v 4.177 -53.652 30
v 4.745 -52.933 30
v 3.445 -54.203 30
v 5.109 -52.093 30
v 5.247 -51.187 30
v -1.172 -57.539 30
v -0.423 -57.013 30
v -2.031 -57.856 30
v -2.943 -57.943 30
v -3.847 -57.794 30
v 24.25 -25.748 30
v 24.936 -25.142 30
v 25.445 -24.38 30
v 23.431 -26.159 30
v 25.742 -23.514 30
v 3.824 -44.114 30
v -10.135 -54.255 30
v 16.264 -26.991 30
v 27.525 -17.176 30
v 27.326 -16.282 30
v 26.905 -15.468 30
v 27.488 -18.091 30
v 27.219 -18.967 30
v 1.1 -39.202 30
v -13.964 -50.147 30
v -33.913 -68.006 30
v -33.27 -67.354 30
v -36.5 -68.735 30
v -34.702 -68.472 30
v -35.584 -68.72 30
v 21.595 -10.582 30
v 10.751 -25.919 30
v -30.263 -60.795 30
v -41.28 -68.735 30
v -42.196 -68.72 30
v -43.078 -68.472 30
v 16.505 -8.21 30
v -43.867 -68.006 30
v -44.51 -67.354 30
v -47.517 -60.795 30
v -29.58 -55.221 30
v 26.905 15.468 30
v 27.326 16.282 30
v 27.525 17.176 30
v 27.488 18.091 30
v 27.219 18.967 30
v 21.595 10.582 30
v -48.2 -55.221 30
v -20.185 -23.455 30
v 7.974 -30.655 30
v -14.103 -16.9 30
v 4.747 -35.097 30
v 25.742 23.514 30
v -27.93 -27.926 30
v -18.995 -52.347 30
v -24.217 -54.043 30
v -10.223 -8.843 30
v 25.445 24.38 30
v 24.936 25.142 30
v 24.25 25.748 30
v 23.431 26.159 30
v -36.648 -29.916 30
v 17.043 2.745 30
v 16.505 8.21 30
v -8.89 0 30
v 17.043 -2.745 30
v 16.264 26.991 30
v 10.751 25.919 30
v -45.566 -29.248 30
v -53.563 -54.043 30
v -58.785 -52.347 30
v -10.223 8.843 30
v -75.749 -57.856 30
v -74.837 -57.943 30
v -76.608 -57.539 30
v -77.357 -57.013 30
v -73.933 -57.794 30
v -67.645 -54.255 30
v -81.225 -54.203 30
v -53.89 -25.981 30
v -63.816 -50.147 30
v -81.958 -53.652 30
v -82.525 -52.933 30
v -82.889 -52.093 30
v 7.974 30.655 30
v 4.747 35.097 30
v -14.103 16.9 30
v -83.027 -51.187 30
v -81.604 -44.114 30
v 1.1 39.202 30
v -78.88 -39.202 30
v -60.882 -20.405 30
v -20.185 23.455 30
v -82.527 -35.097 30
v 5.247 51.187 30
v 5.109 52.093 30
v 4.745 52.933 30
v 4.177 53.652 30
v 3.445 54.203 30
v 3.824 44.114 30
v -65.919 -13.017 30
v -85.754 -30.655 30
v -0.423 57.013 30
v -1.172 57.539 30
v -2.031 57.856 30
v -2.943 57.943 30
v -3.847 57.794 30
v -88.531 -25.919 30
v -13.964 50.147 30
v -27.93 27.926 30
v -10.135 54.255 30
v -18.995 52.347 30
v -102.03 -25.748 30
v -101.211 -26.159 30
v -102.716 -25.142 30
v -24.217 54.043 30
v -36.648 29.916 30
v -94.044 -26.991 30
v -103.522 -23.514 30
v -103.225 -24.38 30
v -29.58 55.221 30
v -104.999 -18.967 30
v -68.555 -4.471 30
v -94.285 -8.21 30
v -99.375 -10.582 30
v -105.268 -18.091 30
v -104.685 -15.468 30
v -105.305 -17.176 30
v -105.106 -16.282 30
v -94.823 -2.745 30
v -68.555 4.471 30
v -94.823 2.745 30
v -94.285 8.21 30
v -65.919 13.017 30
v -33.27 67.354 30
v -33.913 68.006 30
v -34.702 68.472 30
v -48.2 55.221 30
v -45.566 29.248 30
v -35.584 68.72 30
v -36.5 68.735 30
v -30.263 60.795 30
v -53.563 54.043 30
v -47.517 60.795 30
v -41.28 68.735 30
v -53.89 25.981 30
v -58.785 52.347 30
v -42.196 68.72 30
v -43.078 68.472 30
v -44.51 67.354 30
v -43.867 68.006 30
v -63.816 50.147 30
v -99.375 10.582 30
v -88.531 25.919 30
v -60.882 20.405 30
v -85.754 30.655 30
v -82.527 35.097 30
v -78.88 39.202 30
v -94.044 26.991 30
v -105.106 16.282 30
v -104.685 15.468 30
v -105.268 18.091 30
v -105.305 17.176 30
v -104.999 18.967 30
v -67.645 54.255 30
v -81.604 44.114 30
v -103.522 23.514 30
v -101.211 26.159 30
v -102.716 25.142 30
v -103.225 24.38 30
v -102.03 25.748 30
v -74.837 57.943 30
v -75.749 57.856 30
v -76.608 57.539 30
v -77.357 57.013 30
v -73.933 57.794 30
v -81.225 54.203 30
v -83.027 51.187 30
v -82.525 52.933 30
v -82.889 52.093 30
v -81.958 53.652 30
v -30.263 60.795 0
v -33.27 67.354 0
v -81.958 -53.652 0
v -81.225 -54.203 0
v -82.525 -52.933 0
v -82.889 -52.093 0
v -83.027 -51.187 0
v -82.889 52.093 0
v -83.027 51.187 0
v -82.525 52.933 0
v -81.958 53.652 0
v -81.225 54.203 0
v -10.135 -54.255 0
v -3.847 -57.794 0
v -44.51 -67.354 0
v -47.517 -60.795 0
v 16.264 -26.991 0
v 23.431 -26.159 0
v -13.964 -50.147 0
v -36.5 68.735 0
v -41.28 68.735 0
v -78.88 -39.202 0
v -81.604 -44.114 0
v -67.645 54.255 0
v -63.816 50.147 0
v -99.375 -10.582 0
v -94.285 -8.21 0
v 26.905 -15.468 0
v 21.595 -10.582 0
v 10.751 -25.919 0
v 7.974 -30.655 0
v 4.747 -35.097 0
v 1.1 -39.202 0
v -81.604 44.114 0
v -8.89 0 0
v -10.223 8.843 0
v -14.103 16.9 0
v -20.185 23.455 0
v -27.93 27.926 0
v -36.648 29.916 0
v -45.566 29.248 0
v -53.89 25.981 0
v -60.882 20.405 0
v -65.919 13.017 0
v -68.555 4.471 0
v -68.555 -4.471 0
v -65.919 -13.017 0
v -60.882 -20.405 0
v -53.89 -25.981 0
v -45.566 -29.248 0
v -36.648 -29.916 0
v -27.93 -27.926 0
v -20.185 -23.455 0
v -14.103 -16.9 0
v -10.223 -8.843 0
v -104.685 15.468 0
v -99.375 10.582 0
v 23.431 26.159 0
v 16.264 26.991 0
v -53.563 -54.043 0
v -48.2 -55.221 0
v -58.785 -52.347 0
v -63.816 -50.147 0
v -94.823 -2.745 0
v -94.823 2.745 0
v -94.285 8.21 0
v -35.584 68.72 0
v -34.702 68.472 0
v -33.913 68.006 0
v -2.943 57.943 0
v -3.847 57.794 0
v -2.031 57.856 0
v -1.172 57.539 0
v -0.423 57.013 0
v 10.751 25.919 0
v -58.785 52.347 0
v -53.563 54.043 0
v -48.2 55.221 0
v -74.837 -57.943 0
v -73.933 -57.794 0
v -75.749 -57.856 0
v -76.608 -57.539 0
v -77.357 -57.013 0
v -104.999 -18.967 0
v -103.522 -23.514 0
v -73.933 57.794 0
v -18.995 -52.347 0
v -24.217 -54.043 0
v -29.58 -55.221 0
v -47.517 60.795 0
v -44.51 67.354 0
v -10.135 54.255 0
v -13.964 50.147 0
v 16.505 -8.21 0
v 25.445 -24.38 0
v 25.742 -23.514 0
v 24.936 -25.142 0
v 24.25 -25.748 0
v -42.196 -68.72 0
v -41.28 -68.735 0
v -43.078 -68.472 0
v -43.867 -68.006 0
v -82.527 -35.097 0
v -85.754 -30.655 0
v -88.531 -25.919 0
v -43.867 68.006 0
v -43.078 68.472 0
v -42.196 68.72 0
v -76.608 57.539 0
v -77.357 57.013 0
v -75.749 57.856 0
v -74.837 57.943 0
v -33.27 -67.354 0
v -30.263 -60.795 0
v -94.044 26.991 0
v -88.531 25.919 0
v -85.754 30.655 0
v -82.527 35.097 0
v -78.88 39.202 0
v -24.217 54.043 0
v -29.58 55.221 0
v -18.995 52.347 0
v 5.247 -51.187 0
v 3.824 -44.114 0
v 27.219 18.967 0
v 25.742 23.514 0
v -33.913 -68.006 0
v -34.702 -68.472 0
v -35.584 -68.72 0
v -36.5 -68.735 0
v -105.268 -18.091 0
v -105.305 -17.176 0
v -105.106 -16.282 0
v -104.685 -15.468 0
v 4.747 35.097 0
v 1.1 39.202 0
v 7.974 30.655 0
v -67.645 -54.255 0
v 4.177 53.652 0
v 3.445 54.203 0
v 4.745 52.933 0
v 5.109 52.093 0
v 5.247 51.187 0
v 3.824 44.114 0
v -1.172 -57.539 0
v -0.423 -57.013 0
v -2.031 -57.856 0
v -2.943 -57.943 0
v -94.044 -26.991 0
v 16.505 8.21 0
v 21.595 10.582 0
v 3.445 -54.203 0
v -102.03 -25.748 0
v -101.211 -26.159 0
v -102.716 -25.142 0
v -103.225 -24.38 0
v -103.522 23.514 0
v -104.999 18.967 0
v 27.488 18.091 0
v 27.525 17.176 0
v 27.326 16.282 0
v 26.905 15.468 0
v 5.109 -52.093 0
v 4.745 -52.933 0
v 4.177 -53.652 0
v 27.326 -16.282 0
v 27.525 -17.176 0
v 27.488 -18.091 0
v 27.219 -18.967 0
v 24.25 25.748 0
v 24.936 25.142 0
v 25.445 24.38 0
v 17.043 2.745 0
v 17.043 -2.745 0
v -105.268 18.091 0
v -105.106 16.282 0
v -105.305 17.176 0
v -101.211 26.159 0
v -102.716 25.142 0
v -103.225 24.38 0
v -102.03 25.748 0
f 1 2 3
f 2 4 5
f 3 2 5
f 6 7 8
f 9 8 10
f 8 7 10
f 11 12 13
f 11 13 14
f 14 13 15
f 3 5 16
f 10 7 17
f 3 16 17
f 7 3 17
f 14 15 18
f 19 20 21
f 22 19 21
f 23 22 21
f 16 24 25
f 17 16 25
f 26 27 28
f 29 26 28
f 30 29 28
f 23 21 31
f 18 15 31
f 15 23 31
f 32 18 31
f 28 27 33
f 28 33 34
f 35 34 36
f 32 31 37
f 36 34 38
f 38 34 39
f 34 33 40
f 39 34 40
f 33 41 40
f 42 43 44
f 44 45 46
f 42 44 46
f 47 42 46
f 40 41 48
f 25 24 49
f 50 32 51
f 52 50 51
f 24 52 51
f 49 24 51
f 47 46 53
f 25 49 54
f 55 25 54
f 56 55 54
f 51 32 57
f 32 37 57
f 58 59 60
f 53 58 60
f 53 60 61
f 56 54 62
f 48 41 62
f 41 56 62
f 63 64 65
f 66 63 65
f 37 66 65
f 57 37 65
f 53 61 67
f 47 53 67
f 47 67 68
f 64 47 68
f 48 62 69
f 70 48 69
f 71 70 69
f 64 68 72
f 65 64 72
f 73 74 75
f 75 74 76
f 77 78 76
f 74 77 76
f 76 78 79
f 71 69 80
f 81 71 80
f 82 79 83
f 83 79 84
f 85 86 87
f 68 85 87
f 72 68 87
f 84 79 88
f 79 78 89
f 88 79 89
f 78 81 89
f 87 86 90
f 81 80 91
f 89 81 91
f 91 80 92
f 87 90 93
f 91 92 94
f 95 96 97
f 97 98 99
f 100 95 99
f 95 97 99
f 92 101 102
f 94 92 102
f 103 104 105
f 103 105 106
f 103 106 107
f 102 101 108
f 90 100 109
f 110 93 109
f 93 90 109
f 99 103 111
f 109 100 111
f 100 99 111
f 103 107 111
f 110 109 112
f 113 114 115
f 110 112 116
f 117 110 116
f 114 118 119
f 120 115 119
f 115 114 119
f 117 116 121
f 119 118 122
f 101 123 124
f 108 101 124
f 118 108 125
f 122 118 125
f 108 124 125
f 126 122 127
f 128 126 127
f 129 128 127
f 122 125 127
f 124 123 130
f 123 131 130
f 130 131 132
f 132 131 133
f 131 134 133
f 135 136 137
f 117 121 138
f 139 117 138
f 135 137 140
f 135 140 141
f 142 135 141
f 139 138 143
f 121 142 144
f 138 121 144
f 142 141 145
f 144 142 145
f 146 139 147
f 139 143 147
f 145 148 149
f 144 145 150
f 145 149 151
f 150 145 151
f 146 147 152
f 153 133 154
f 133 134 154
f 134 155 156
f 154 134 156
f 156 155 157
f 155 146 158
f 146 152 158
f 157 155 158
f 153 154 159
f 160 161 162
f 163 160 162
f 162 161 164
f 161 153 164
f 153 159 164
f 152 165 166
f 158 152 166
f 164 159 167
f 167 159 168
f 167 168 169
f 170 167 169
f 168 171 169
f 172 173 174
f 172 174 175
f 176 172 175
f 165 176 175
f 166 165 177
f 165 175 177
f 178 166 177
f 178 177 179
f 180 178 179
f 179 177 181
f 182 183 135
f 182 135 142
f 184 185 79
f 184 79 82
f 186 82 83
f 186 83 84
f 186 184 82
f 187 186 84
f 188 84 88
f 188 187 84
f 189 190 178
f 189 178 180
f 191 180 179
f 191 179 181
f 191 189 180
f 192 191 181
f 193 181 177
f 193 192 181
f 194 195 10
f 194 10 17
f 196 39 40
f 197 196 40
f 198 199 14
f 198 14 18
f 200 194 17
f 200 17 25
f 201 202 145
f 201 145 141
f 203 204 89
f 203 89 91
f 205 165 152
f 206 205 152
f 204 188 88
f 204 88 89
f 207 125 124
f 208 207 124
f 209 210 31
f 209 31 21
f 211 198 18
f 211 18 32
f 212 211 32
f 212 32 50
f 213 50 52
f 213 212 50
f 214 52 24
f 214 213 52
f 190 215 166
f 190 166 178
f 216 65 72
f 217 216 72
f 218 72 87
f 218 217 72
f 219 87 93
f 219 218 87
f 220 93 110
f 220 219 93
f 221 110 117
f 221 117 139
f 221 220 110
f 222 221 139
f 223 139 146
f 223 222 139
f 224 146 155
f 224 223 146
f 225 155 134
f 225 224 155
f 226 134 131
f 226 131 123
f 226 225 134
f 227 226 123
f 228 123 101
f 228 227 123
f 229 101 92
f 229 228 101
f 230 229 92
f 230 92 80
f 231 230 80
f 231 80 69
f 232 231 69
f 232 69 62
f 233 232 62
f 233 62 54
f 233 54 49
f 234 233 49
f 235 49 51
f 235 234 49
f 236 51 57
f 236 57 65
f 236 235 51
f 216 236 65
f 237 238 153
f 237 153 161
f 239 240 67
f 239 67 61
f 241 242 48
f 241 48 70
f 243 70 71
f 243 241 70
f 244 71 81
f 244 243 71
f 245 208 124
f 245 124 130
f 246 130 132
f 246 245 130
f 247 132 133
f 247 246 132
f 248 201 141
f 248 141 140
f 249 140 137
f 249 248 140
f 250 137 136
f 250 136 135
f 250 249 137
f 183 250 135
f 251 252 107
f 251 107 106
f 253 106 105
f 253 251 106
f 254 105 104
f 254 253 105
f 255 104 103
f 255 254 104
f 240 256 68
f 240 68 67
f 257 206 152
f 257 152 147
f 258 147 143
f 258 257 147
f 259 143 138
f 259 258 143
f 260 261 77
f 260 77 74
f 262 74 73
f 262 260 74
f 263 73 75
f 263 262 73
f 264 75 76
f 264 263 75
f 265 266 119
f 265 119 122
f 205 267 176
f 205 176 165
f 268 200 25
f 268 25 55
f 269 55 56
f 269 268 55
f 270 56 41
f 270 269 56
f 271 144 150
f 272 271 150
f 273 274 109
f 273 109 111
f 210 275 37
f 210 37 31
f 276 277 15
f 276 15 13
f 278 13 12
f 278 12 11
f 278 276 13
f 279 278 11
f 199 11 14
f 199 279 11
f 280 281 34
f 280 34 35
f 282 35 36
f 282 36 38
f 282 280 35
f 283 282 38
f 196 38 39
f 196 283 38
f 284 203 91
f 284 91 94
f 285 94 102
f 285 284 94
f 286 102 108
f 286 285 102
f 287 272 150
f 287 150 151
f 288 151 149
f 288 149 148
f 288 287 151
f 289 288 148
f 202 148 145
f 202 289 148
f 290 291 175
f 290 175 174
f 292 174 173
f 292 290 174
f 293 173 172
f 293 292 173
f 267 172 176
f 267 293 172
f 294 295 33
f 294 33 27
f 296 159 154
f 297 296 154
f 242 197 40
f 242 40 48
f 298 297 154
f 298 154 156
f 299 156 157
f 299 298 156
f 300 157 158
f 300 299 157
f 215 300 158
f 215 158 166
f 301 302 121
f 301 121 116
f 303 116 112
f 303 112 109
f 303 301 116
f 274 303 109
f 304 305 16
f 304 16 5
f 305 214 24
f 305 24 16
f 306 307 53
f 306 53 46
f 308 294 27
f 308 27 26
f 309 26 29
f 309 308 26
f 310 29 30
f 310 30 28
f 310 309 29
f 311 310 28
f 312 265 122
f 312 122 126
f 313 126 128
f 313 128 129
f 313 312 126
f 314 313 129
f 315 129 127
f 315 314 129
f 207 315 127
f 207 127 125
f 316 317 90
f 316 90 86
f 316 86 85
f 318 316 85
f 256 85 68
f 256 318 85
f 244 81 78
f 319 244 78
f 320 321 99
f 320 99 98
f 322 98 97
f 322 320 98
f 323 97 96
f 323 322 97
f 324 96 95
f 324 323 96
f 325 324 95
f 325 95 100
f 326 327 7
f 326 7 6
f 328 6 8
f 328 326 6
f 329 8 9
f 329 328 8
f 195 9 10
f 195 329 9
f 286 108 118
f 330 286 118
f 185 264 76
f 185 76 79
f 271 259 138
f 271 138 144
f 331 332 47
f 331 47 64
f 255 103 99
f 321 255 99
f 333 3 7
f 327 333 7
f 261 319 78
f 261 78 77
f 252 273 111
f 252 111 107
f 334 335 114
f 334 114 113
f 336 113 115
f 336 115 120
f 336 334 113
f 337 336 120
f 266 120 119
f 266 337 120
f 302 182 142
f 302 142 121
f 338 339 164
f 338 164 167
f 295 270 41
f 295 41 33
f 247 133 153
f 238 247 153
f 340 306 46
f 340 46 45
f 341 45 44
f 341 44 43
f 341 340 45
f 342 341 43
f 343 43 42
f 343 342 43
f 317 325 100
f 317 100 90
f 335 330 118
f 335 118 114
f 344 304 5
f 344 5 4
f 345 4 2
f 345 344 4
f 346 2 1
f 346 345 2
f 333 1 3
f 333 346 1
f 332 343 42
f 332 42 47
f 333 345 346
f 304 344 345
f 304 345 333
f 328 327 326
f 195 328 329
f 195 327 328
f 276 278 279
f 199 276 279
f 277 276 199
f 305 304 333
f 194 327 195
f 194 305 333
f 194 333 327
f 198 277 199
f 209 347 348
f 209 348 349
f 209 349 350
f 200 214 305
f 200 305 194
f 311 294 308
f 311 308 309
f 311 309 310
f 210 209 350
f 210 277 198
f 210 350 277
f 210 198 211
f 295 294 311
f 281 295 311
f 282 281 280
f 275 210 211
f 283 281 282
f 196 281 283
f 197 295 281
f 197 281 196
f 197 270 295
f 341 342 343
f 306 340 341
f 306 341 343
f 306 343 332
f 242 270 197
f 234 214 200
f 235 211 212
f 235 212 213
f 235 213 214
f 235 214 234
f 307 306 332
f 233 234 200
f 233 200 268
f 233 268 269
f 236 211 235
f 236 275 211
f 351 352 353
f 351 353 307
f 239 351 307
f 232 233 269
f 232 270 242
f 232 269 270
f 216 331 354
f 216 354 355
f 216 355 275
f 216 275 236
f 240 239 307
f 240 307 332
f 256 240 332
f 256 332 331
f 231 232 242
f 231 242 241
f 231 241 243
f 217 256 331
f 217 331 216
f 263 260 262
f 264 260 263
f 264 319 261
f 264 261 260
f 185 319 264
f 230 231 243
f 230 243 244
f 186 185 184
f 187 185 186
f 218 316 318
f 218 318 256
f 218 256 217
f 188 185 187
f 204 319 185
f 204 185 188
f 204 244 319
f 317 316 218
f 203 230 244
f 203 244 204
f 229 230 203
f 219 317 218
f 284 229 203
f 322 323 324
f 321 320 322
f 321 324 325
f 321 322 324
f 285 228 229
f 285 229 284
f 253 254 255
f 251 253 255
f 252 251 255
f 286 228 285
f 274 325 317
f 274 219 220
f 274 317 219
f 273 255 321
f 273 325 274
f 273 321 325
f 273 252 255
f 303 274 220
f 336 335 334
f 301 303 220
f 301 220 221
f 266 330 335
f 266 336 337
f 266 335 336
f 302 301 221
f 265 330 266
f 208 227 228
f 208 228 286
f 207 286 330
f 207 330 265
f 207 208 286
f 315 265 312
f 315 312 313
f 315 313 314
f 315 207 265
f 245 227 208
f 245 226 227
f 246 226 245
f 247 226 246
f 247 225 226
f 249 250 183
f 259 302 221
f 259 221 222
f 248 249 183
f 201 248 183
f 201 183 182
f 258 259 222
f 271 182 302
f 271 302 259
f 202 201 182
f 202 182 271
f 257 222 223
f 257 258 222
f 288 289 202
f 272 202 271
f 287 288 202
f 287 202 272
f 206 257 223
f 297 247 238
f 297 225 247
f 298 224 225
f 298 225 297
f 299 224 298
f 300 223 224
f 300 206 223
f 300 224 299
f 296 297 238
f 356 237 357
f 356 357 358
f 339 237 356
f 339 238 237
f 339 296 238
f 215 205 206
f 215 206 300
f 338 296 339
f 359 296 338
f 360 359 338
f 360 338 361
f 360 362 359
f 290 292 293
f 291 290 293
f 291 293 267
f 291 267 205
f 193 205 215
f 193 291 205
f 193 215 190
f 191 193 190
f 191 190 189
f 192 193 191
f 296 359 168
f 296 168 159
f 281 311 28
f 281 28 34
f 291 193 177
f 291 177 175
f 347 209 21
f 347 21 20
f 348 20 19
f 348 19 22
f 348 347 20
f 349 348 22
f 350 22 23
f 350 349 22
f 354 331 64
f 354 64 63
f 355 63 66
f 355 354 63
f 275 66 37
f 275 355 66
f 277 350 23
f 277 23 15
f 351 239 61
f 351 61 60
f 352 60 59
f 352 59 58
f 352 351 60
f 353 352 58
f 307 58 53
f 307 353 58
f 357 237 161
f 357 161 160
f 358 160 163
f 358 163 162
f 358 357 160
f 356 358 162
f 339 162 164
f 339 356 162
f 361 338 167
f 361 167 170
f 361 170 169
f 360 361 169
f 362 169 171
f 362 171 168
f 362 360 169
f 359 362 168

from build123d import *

# Parameters (mm, degrees)
SZKIC1_R                    = 30
DODANIE_WYCI_GNI_CIE1_DEPTH = 30


with BuildPart() as part:
    # Szkic1 → Dodanie-wyciągnięcie1 (new body)
    with BuildSketch(Plane.XY):
        with BuildLine():
            Line((-48.200266446, 55.220649807), (-47.516798881, 60.795035566))
            Line((-47.516798881, 60.795035566), (-44.510409747, 67.354430039))
            ThreePointArc((-44.510409747, 67.354430039), (-43.078000693, 68.471781184), (-41.280473034, 68.734770905))
            Line((-41.280473034, 68.734770905), (-36.499658689, 68.734770905))
            ThreePointArc((-36.499658689, 68.734770905), (-34.70213103, 68.471781184), (-33.269721976, 67.354430039))
            Line((-33.269721976, 67.354430039), (-30.263332842, 60.795035566))
            Line((-30.263332842, 60.795035566), (-29.579865278, 55.220649807))
            ThreePointArc((-29.579865278, 55.220649807), (-21.585114177, 53.259164913), (-13.964292777, 50.146842733))
            Line((-13.964292777, 50.146842733), (-10.134814162, 54.254883391))
            Line((-10.134814162, 54.254883391), (-3.847078926, 57.794433797))
            ThreePointArc((-3.847078926, 57.794433797), (-2.031473134, 57.856440945), (-0.42266123, 57.01264385))
            Line((-0.42266123, 57.01264385), (3.445098822, 54.202551684))
            ThreePointArc((3.445098822, 54.202551684), (4.744747767, 52.933228281), (5.24682851, 51.187323299))
            Line((5.24682851, 51.187323299), (3.823533075, 44.113550502))
            Line((3.823533075, 44.113550502), (1.09992821, 39.202045535))
            ThreePointArc((1.09992821, 39.202045535), (6.414885823, 32.915974128), (10.75088277, 25.918646164))
            Line((10.75088277, 25.918646164), (16.263641763, 26.991209816))
            Line((16.263641763, 26.991209816), (23.431021953, 26.158928205))
            ThreePointArc((23.431021953, 26.158928205), (24.936324781, 25.141906732), (25.741909464, 23.513624632))
            Line((25.741909464, 23.513624632), (27.219262344, 18.966799996))
            ThreePointArc((27.219262344, 18.966799996), (27.52461085, 17.17598131), (26.904585503, 15.468398852))
            Line((26.904585503, 15.468398852), (21.595255981, 10.582188511))
            Line((21.595255981, 10.582188511), (16.504903173, 8.209592297))
            ThreePointArc((16.504903173, 8.209592297), (17.109934138, 0), (16.504903173, -8.209592297))
            Line((16.504903173, -8.209592297), (21.595255981, -10.582188511))
            Line((21.595255981, -10.582188511), (26.904585503, -15.468398852))
            ThreePointArc((26.904585503, -15.468398852), (27.52461085, -17.17598131), (27.219262344, -18.966799996))
            Line((27.219262344, -18.966799996), (25.741909464, -23.513624632))
            ThreePointArc((25.741909464, -23.513624632), (24.936324781, -25.141906732), (23.431021953, -26.158928205))
            Line((23.431021953, -26.158928205), (16.263641763, -26.991209816))
            Line((16.263641763, -26.991209816), (10.75088277, -25.918646164))
            ThreePointArc((10.75088277, -25.918646164), (6.414885823, -32.915974128), (1.09992821, -39.202045535))
            Line((1.09992821, -39.202045535), (3.823533075, -44.113550502))
            Line((3.823533075, -44.113550502), (5.24682851, -51.187323299))
            ThreePointArc((5.24682851, -51.187323299), (4.744747767, -52.933228281), (3.445098822, -54.202551684))
            Line((3.445098822, -54.202551684), (-0.42266123, -57.01264385))
            ThreePointArc((-0.42266123, -57.01264385), (-2.031473134, -57.856440945), (-3.847078926, -57.794433797))
            Line((-3.847078926, -57.794433797), (-10.134814162, -54.254883391))
            Line((-10.134814162, -54.254883391), (-13.964292777, -50.146842733))
            ThreePointArc((-13.964292777, -50.146842733), (-21.585114177, -53.259164913), (-29.579865278, -55.220649807))
            Line((-29.579865278, -55.220649807), (-30.263332842, -60.795035566))
            Line((-30.263332842, -60.795035566), (-33.269721976, -67.354430039))
            ThreePointArc((-33.269721976, -67.354430039), (-34.70213103, -68.471781184), (-36.499658689, -68.734770905))
            Line((-36.499658689, -68.734770905), (-41.280473034, -68.734770905))
            ThreePointArc((-41.280473034, -68.734770905), (-43.078000693, -68.471781184), (-44.510409747, -67.354430039))
            Line((-44.510409747, -67.354430039), (-47.516798881, -60.795035566))
            Line((-47.516798881, -60.795035566), (-48.200266446, -55.220649807))
            ThreePointArc((-48.200266446, -55.220649807), (-56.195017547, -53.259164913), (-63.815838947, -50.146842733))
            Line((-63.815838947, -50.146842733), (-67.645317562, -54.254883391))
            Line((-67.645317562, -54.254883391), (-73.933052797, -57.794433797))
            ThreePointArc((-73.933052797, -57.794433797), (-75.74865859, -57.856440945), (-77.357470494, -57.01264385))
            Line((-77.357470494, -57.01264385), (-81.225230545, -54.202551684))
            ThreePointArc((-81.225230545, -54.202551684), (-82.52487949, -52.933228281), (-83.026960233, -51.187323299))
            Line((-83.026960233, -51.187323299), (-81.603664799, -44.113550502))
            Line((-81.603664799, -44.113550502), (-78.880059934, -39.202045535))
            ThreePointArc((-78.880059934, -39.202045535), (-84.195017547, -32.915974128), (-88.531014493, -25.918646164))
            Line((-88.531014493, -25.918646164), (-94.043773486, -26.991209816))
            Line((-94.043773486, -26.991209816), (-101.211153677, -26.158928205))
            ThreePointArc((-101.211153677, -26.158928205), (-102.716456505, -25.141906732), (-103.522041188, -23.513624632))
            Line((-103.522041188, -23.513624632), (-104.999394067, -18.966799996))
            ThreePointArc((-104.999394067, -18.966799996), (-105.304742573, -17.17598131), (-104.684717227, -15.468398852))
            Line((-104.684717227, -15.468398852), (-99.375387704, -10.582188511))
            Line((-99.375387704, -10.582188511), (-94.285034896, -8.209592297))
            ThreePointArc((-94.285034896, -8.209592297), (-94.890065862, 0), (-94.285034896, 8.209592297))
            Line((-94.285034896, 8.209592297), (-99.375387704, 10.582188511))
            Line((-99.375387704, 10.582188511), (-104.684717227, 15.468398852))
            ThreePointArc((-104.684717227, 15.468398852), (-105.304742573, 17.17598131), (-104.999394067, 18.966799996))
            Line((-104.999394067, 18.966799996), (-103.522041188, 23.513624632))
            ThreePointArc((-103.522041188, 23.513624632), (-102.716456505, 25.141906732), (-101.211153677, 26.158928205))
            Line((-101.211153677, 26.158928205), (-94.043773486, 26.991209816))
            Line((-94.043773486, 26.991209816), (-88.531014493, 25.918646164))
            ThreePointArc((-88.531014493, 25.918646164), (-84.195017547, 32.915974128), (-78.880059934, 39.202045535))
            Line((-78.880059934, 39.202045535), (-81.603664799, 44.113550502))
            Line((-81.603664799, 44.113550502), (-83.026960233, 51.187323299))
            ThreePointArc((-83.026960233, 51.187323299), (-82.52487949, 52.933228281), (-81.225230545, 54.202551684))
            Line((-81.225230545, 54.202551684), (-77.357470494, 57.01264385))
            ThreePointArc((-77.357470494, 57.01264385), (-75.74865859, 57.856440945), (-73.933052797, 57.794433797))
            Line((-73.933052797, 57.794433797), (-67.645317562, 54.254883391))
            Line((-67.645317562, 54.254883391), (-63.815838947, 50.146842733))
            ThreePointArc((-63.815838947, 50.146842733), (-56.195017547, 53.259164913), (-48.200266446, 55.220649807))
        make_face()
        with Locations((-38.890065862, 0)):
            Circle(SZKIC1_R, mode=Mode.SUBTRACT)
    extrude(amount=DODANIE_WYCI_GNI_CIE1_DEPTH)


solid = part.part
